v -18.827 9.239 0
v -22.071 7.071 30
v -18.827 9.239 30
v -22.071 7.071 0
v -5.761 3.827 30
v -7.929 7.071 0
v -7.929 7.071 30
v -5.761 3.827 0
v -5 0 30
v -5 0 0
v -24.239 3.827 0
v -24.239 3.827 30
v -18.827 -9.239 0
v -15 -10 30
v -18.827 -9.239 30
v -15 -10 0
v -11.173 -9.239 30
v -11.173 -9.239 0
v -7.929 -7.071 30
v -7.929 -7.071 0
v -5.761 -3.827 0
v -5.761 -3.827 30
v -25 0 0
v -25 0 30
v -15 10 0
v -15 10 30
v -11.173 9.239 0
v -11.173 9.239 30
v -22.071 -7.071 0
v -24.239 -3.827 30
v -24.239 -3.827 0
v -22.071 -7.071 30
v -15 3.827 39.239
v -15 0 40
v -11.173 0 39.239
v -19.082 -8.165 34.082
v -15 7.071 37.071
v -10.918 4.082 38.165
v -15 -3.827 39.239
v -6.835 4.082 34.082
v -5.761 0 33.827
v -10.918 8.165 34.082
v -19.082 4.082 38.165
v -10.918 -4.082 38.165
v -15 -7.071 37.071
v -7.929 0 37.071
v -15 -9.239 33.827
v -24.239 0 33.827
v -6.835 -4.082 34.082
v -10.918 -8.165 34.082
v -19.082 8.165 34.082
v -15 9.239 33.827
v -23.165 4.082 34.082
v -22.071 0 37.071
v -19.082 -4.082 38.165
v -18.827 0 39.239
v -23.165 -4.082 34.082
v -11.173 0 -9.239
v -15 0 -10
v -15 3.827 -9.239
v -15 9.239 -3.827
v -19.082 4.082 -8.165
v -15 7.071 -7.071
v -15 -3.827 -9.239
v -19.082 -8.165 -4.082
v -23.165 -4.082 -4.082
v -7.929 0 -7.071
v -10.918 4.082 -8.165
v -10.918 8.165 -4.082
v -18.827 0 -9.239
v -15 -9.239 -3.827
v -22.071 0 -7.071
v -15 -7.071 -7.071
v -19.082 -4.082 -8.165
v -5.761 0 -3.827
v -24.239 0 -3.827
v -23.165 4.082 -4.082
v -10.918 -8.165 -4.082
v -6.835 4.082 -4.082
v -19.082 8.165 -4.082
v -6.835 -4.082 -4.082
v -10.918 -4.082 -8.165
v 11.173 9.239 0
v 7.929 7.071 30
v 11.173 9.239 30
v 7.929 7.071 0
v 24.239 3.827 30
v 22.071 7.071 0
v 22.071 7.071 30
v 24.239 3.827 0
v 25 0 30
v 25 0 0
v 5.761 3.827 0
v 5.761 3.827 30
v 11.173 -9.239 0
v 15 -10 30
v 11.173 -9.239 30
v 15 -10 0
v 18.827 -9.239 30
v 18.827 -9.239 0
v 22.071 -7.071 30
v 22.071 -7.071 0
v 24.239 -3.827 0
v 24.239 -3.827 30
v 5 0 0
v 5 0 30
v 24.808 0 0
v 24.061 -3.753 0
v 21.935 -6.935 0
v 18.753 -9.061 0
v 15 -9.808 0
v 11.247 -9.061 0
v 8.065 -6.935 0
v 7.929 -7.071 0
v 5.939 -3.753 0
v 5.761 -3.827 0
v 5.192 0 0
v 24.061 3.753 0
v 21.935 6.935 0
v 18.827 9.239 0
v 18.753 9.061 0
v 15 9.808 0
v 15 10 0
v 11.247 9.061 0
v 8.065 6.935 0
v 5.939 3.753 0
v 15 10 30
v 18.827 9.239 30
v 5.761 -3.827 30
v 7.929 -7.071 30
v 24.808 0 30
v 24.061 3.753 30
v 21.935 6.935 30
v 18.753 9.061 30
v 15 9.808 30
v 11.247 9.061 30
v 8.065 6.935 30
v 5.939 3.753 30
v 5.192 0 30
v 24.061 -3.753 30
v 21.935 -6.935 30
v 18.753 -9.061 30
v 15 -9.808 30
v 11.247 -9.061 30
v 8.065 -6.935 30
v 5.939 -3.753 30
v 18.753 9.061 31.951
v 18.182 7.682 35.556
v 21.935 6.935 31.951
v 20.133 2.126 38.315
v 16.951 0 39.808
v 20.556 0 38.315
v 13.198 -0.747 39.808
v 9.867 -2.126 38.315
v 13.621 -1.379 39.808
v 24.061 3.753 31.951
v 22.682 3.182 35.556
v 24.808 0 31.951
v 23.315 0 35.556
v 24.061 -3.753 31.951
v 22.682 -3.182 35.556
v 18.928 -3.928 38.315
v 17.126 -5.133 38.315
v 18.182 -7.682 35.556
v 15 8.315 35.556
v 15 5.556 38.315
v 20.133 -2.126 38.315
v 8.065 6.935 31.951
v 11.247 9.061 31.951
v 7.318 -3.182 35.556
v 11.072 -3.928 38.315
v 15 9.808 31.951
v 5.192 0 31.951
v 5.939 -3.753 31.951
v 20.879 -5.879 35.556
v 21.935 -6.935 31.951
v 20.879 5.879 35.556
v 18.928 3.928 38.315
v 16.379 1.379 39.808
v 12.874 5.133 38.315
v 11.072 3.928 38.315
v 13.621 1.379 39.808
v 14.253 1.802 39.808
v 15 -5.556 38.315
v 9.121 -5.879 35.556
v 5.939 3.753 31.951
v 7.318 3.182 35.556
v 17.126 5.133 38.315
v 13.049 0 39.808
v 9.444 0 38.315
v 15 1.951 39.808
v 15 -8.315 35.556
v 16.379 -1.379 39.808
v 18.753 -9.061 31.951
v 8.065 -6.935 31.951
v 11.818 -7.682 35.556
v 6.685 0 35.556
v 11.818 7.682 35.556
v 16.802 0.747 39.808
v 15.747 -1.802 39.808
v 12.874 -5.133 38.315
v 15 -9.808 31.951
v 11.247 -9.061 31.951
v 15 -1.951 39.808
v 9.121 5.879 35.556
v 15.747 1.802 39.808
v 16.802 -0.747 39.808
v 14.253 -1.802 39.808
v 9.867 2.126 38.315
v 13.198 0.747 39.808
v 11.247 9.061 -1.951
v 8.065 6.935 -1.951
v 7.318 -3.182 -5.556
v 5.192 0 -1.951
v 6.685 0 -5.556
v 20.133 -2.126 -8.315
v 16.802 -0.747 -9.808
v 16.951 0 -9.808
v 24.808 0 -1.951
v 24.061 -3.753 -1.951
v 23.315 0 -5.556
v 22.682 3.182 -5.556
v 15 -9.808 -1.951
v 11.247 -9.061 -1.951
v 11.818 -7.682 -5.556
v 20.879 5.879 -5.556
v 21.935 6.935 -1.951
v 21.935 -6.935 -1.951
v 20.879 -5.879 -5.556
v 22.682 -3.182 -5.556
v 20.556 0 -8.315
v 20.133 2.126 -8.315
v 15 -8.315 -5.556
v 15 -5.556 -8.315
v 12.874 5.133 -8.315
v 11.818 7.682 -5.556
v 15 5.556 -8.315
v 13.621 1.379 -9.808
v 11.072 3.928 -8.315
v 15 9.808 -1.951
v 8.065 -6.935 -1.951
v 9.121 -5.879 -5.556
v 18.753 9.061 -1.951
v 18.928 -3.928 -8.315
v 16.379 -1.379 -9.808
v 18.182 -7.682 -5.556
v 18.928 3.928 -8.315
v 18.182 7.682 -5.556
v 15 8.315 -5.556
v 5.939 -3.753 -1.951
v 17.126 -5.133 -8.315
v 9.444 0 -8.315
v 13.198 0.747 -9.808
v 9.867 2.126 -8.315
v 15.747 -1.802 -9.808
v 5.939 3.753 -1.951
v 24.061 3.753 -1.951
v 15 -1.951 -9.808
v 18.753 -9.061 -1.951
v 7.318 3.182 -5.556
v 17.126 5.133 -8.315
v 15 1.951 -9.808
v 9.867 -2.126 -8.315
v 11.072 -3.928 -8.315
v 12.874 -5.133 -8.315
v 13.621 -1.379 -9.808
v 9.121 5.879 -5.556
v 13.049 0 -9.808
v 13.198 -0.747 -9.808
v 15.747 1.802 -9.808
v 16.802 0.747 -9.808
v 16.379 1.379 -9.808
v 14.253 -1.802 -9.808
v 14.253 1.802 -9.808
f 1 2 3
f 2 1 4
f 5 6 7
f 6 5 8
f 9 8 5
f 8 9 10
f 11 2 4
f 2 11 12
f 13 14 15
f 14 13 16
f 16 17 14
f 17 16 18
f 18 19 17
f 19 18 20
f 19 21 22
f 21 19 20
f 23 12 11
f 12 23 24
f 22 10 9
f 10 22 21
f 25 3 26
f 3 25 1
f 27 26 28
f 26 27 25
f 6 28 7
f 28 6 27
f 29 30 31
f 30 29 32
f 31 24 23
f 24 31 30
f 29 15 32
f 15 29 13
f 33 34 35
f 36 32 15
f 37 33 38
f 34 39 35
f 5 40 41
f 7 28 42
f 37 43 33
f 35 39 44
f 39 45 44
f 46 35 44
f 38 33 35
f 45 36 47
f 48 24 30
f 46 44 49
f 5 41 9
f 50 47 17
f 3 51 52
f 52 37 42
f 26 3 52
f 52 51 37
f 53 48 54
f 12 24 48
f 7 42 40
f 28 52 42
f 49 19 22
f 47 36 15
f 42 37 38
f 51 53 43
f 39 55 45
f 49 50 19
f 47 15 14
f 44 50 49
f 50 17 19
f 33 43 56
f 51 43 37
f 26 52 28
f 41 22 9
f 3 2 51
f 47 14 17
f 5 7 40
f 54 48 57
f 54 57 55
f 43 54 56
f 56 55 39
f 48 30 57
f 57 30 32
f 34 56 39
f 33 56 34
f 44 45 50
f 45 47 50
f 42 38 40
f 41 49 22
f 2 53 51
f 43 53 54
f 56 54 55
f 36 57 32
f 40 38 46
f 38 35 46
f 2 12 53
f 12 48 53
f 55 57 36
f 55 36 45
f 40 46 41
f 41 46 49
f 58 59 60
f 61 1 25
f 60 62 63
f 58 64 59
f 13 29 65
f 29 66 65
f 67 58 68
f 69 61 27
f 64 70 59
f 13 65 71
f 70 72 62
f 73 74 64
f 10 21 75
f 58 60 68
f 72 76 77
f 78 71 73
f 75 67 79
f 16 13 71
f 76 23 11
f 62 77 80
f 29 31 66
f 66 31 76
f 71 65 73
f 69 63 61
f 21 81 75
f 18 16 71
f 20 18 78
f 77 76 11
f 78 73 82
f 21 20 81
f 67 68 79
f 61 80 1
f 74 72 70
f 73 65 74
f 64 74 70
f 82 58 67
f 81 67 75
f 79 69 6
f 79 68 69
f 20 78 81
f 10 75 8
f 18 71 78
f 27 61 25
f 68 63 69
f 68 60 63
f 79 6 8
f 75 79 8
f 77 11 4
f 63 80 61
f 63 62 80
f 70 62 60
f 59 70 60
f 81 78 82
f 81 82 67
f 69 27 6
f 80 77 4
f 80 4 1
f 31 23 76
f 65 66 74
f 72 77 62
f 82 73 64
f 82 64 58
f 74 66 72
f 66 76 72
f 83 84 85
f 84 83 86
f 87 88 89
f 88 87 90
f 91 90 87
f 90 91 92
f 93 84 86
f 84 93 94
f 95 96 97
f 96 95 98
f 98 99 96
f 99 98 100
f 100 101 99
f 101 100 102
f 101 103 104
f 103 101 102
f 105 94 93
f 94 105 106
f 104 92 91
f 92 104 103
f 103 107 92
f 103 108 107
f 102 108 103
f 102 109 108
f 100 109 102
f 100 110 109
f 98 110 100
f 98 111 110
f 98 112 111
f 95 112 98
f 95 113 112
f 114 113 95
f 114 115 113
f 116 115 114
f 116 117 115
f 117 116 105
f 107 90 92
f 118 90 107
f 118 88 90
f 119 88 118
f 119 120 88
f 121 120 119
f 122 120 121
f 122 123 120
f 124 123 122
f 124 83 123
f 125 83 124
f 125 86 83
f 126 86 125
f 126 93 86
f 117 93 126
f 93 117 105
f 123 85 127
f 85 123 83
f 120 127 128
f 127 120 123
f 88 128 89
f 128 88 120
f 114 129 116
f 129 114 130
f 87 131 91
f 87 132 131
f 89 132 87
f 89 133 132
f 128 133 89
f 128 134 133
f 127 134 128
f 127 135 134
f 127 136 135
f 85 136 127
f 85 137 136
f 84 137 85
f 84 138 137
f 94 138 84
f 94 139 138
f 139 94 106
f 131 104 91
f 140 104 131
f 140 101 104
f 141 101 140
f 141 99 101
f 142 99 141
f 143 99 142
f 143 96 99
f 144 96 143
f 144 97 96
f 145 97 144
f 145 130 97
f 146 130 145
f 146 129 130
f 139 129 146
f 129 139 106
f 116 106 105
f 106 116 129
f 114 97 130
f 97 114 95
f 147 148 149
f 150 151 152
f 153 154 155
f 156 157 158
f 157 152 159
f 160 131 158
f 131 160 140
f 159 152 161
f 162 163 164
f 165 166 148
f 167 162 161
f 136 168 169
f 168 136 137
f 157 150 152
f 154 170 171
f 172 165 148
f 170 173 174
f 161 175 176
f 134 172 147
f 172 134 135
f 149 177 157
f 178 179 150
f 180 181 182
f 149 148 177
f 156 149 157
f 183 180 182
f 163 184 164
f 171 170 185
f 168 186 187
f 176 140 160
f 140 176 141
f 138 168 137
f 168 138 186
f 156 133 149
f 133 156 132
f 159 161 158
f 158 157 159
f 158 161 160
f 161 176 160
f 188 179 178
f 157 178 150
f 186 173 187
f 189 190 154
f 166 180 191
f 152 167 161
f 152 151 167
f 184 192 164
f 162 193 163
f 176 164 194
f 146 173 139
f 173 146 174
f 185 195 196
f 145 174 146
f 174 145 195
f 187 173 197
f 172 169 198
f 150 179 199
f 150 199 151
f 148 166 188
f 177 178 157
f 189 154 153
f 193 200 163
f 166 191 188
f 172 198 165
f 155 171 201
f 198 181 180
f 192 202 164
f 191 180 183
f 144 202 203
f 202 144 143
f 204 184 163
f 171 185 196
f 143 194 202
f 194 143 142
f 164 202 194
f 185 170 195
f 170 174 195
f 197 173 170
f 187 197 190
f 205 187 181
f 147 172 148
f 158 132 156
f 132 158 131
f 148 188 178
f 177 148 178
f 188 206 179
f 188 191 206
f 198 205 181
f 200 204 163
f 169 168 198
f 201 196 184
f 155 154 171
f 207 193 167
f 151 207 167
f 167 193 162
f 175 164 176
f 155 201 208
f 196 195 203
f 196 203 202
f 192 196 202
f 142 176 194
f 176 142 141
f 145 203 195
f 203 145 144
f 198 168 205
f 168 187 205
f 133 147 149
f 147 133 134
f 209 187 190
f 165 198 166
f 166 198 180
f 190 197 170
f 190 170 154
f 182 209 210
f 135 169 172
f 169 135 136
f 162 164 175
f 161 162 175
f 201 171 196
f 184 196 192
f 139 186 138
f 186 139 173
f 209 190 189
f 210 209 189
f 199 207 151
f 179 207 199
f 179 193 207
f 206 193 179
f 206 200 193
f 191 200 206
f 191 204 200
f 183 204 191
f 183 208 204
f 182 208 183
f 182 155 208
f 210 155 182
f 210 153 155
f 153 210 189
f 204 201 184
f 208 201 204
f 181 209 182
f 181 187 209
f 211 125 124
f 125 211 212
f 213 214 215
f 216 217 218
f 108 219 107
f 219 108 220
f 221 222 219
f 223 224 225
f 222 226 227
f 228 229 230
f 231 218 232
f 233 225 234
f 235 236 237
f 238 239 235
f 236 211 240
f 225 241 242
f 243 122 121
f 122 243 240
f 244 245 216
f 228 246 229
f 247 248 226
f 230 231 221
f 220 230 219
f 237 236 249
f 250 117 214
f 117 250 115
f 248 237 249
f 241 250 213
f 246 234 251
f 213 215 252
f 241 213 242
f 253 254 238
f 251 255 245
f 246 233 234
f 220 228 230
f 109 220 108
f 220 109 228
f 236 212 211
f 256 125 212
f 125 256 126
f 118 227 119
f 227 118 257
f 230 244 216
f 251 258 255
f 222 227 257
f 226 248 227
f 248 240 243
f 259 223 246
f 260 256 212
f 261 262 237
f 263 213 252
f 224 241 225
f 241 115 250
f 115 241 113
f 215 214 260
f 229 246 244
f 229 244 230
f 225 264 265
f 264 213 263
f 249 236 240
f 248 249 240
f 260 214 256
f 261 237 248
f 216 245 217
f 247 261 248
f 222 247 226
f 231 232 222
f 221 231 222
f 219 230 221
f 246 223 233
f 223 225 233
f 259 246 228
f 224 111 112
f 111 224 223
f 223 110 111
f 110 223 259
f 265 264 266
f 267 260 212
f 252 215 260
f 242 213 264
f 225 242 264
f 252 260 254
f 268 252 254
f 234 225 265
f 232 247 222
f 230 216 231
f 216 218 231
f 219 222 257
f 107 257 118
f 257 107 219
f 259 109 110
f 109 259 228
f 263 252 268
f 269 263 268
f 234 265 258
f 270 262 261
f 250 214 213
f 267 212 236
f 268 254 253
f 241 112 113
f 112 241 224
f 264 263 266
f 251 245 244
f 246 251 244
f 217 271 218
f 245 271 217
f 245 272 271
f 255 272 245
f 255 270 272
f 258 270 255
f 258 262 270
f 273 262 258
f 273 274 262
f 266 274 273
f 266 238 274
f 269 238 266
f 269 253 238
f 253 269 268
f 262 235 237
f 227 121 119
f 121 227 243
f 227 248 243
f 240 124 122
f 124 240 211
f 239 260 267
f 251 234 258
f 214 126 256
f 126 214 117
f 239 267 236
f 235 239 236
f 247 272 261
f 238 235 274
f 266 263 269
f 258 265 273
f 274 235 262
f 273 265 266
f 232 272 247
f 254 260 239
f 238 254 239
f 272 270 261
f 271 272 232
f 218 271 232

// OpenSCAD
// file: ../octsphere.scad
//=== octsphere.scad ===
/**
 * @file octsphere.scad
 * @brief Geodesic sphere or hemisphere based on an octahedron with equatorial polygonal symmetry.
 *
 * This OpenSCAD module/function generates a geodesic sphere or hemisphere with flat equators 
 * aligned with the XY, YZ, and XZ planes. It uses an octahedron base to maintain regular polygon
 * equators, unlike icosahedron-based geodesic domes which lack flat symmetry at the equator.
 *
 * ## Usage
 * Add this file to your `.scad` project and use one of the following methods:
 *
 * Modular rendering (similar to built-in `sphere()`):
 * ```scad
 * octsphere(r=radius);              // or:
 * octsphere(d=diameter);
 * ```
 *
 * Functional call (returns polyhedron data):
 * ```scad
 * mesh = octsphere(r=radius);
 * polyhedron(points = mesh[0], faces = mesh[1]);
 * ```
 *
 * Optional parameters:
 * - `r` / `d`  : radius or diameter (default = 1)
 * - `hemisphere` : true to generate a hemisphere (default = false)
 *
 * The `$fn`, `$fa`, and `$fs` special variables control polygon resolution. The number of equator sides
 * will snap to the nearest of the form 4×2ⁿ (e.g., 4, 8, 16, 32, 64, 128).
 *
 * ## Background
 * Octahedron-based geodesic spheres offer equators that lie in all three principal planes, which can 
 * better interface with other regular polygon geometry. This structure enables easier alignment with 
 * cylinders, prisms, and other modular shapes in parametric designs.
 *
 * For more hemisphere flexibility, see: [Geodesic Hemisphere](https://www.printables.com/model/129119)
 *
 * ## References and Acknowledgements
 * - Octsphere by Amatulic, CC0 (public domain): https://www.thingiverse.com/thing:6481347
 *   and https://www.printables.com/model/762498
 * - Geodesic Sphere by Jamie Kawabata (Jamie_K), CC0, which it builds on:
 *   https://www.thingiverse.com/thing:1484333
 * - Geodesic Hemisphere: https://www.printables.com/model/129119
 *
 * Changes in this copy (Cameron Brooks): resolution falls back on $fa and $fs
 * when $fn isn't set; the demo moved to examples/compare.scad.
 */

//=== Module: octahedral sphere or hemisphere ===

/**
 * @module octsphere
 * @brief Renders a geodesic octahedral sphere or hemisphere as a polyhedron.
 * @param r Radius of the sphere (default = -1; must be > 0 if used)
 * @param d Diameter of the sphere (default = -1; must be > 0 if used)
 * @param hemisphere If true, generates only the upper hemisphere
 */
module octsphere(r = -1, d = -1, hemisphere = false) {
    mesh = octsphere(r, d, hemisphere);
    polyhedron(points=mesh[0], faces=mesh[1]);
}

//=== Function: octahedral geodesic sphere or hemisphere ===

/**
 * @function octsphere
 * @brief Returns a [vertices, faces] array representing an octahedral geodesic polyhedron.
 * @param r Radius (preferred, optional)
 * @param d Diameter (alternative to r, optional)
 * @param hemisphere Generate only upper hemisphere if true
 * @return Array: [vertex list, face list]
 */
function octsphere(r = -1, d = -1, hemisphere = false) =
    let (
        rad = r > 0 ? r : d > 0 ? d / 2 : 1, // Default radius = 1
        // Equator sides: $fn if set, otherwise $fa and $fs, by the rule
        // OpenSCAD's own sphere() uses; at least 4, the octahedron's equator.
        fn = max(4, $fn > 0 ? $fn : ceil(max(min(360 / $fa, rad * 2 * PI / $fs), 5))),
        log2 = log(2.0),
        pn = (log(fn) - log(4)) / log2,
        dpn = [abs(4 * 2 ^ floor(pn) - fn), abs(4 * 2 ^ ceil(pn) - fn)],
        levels = floor(pn) + (argmin(dpn) % 2),
        nlv = 4 * 2 ^ levels,
        octahedron = [
            [
                [0, 0, 1],
                [0, 1, 0],
                [0, -1, 0],
                [1, 0, 0],
                [-1, 0, 0],
                if (!hemisphere) [0, 0, -1],
            ],
            hemisphere ? [[0, 1, 3], [0, 3, 2], [0, 2, 4], [0, 4, 1]]
            : [
                [0, 1, 3],
                [0, 3, 2],
                [0, 2, 4],
                [0, 4, 1],
                [5, 3, 1],
                [5, 2, 3],
                [5, 4, 2],
                [5, 1, 4],
            ],
        ],
        subdivided = multi_subdiv_pf(octahedron, levels),
        vertices = hemisphere ? concat(
                subdivided[0], [
                    for (n = [0:nlv]) let (t = n * 360 / nlv) [cos(t), sin(t), 0],
                ]
            )
        : subdivided[0],
        faces = hemisphere ? let (pstart = len(vertices) - nlv) concat(subdivided[1], [[for (n = [0:nlv - 1]) pstart + n]])
        : subdivided[1]
    ) [rad * vertices, faces];

//=== Support Functions ===

/**
 * @function argmin
 * @brief Return index of minimum value in a list.
 * @param v Array of values
 * @return Integer index of smallest value
 */
function argmin(v, k = 0, mem = [-1, ceil(1 / 0)]) =
    (k == len(v)) ? mem[0]
    : v[k] < mem[1] ? argmin(v, k + 1, [k, v[k]])
    : argmin(v, k + 1, mem);

/**
 * @function midpt
 * @brief Compute unit-length midpoint of two 3D points on a sphere.
 * @param p1 First 3D point
 * @param p2 Second 3D point
 * @return Midpoint vector normalized to length 1
 */
function midpt(p1, p2) =
    let (mid = 0.5 * (p1 + p2)) mid / norm(mid);

/**
 * @function subdivpf
 * @brief Subdivide each triangle face into 4 smaller triangles on a unit sphere.
 * @param pf Array of [points, faces]
 * @return Subdivided [points, faces]
 */
function subdivpf(pf) =
    let (p = pf[0], faces = pf[1]) [
            [
                // new points
                for (f = faces) let (p0 = p[f[0]], p1 = p[f[1]], p2 = p[f[2]]) each [p0, p1, p2, midpt(p0, p1), midpt(p1, p2), midpt(p0, p2)],
            ],
            [
                // new faces
                for (i = [0:len(faces) - 1]) let (base = 6 * i) each [
                    [base, base + 3, base + 5],
                    [base + 3, base + 1, base + 4],
                    [base + 5, base + 4, base + 2],
                    [base + 3, base + 4, base + 5],
                ],
            ],
    ];

/**
 * @function multi_subdiv_pf
 * @brief Recursively subdivide a polyhedron into finer faces.
 * @param pf Array of [points, faces]
 * @param levels Number of recursive subdivision levels
 * @return Refined [points, faces]
 */
function multi_subdiv_pf(pf, levels) =
    (levels == 0) ? pf
    : multi_subdiv_pf(subdivpf(pf), levels - 1);
// main file
// Capsules capped with octsphere() and with sphere(), side by side.
// The octsphere's equator has the cylinder's vertices, so the caps meet the cylinder edge to
// edge. sphere() has no ring on its equator, so its caps leave a step at each end.

use <../octsphere.scad>;

// Sides around the cylinder and each equator; octsphere snaps to 4, 8, 16, 32, 64 or 128
sides = 16; // [4, 8, 16, 32, 64, 128]
// Radius of the capsule (mm)
radius = 10; // [2:1:50]
// Length of the straight part (mm)
length = 30; // [0:1:200]

$fn = sides;

// Left: octsphere caps.
translate([-radius * 1.5, 0, 0]) color("lightgreen") {
        cylinder(r=radius, h=length);
        translate([0, 0, length]) octsphere(radius, hemisphere=true);
        mirror([0, 0, 1]) octsphere(radius, hemisphere=true);
    }

// Right: sphere() caps.
translate([radius * 1.5, 0, 0]) color("pink") {
        cylinder(r=radius, h=length);
        translate([0, 0, length]) sphere(radius);
        sphere(radius);
    }
